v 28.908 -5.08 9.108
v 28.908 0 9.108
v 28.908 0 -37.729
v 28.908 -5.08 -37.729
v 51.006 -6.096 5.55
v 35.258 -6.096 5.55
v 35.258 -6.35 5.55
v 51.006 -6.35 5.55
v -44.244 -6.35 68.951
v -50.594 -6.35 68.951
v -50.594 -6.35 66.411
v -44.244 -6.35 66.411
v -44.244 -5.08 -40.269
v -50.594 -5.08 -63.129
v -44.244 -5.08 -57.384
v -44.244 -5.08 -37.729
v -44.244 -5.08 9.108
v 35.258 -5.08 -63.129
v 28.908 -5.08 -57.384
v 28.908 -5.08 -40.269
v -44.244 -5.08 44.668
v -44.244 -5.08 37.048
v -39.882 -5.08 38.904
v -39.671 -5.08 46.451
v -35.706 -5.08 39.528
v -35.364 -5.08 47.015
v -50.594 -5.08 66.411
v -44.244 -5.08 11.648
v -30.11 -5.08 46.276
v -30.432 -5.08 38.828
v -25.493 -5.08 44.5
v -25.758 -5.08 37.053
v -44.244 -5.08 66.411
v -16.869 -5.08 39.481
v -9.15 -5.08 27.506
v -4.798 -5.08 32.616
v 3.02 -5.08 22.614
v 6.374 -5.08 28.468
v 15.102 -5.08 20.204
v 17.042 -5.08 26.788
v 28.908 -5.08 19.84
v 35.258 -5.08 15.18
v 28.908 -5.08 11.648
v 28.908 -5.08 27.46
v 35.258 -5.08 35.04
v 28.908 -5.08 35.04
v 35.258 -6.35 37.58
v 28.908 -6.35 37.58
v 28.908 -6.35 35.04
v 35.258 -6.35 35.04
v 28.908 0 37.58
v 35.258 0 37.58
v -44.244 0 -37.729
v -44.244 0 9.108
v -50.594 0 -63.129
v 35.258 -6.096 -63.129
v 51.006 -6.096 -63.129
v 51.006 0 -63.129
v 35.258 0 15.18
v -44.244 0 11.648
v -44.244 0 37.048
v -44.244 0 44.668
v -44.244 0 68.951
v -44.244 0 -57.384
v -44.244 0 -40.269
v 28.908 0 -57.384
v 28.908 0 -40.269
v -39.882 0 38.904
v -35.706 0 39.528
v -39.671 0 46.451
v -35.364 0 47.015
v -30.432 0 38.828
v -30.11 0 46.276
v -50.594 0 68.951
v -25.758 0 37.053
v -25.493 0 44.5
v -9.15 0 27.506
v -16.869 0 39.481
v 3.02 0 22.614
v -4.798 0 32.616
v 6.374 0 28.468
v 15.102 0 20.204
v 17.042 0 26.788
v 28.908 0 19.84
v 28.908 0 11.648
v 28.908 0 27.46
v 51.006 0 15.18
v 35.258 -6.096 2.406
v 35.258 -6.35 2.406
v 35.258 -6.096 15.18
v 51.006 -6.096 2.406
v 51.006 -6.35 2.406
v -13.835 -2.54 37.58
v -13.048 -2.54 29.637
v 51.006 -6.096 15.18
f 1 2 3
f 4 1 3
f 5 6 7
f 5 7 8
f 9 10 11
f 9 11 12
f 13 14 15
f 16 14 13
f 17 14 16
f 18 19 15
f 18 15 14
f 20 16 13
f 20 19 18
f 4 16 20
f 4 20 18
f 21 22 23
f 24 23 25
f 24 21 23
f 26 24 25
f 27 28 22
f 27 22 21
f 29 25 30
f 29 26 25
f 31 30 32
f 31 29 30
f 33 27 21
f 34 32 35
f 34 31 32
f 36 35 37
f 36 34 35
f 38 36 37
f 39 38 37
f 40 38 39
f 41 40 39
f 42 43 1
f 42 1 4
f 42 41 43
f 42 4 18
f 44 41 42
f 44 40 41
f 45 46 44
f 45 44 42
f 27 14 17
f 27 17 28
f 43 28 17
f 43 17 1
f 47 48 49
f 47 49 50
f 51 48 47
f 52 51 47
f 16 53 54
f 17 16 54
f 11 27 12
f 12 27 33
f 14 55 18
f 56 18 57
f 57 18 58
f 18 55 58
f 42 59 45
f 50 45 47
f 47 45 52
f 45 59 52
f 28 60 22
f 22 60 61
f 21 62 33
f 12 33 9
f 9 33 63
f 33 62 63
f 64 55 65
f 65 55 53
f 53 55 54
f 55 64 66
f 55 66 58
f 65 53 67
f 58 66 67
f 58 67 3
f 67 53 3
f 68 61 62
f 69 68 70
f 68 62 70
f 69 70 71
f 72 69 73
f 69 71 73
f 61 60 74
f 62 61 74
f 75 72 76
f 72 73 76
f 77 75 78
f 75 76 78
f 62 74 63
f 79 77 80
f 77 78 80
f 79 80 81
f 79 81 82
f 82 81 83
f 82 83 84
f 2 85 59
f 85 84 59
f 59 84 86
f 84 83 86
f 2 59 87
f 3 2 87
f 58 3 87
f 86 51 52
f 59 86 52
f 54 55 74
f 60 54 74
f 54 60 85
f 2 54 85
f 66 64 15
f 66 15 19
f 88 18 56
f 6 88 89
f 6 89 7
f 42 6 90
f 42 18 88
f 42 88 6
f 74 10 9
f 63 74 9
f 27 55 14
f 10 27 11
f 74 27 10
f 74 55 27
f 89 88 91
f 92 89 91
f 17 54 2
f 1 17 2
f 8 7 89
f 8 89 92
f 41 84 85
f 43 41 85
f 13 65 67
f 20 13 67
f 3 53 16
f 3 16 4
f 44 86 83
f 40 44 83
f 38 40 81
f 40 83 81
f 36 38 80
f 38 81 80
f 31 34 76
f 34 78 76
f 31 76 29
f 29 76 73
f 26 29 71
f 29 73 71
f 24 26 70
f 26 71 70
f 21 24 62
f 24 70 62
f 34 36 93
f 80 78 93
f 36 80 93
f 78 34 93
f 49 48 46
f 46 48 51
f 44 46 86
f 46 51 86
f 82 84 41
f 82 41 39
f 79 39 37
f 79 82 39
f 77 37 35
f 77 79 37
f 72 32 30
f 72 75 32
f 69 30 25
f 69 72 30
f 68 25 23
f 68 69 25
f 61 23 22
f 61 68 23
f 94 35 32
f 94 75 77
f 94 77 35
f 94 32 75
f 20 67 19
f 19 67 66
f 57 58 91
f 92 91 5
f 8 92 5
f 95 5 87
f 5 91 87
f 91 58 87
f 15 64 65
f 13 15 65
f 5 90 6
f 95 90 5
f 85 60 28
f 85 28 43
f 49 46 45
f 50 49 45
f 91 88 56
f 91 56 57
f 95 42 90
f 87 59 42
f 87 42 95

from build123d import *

# Parameters (mm, degrees)
F0_W     = 73.152
F0_H     = 5.744279672
F0_H_2   = 2.54
F1_DEPTH = 5.08
F0_W_2   = 6.35
F0_W_3   = 15.748
F0_H_3   = 3.1443536282
F2_DEPTH = 6.35
F0_H_4   = 65.5344708799
F0_H_5   = 9.6294713412
F3_DEPTH = 6.096


# Not quite as in the source:
# - a feature names something its author has since deleted; it is built from what else it names


with BuildPart() as f1:
    # F0 (on Front) → F1 (new body)
    with BuildSketch(Plane.XZ):
        Polygon((-44.2442491055, -63.1286278367), (-44.2442491055, -57.3843481647), (-44.2442491055, -40.2686278367), (-44.2442491055, -37.7286278367), (-44.2442491055, -32.8348538627), (-44.2442491055, -31.8823538627), (-44.2442491055, -30.9298538627), (-44.2442491055, -20.7698538627), (-44.2442491055, -19.8173538627), (-44.2442491055, -18.8648538627), (-44.2442491055, 9.1076644534), (-44.2442491055, 11.6476644534), (-44.2442491055, 15.1796680125), (-44.2442491055, 37.0476644534), (-44.2442491055, 44.6676644534), (-44.2442491055, 66.4113721633), (-50.5942491055, 66.4113721633), (-50.5942491055, -63.1286278367), align=None)
        with BuildLine():
            add(Edge.make_bspline(
                [(28.9077508945, 27.4595177274), (11.3712688144, 24.6047450509), (-13.4084815754, 35.2112312639), (-32.4729044871, 50.7994146886), (-44.2442491055, 44.6676644534)],
                knots=[0, 0, 0, 0, 0.5425588266, 1, 1, 1, 1], degree=3))
            Line((-44.2442491055, 44.6676644534), (-44.2442491055, 37.0476644534))
            add(Edge.make_bspline(
                [(28.9077508945, 19.8395177274), (11.5484302318, 18.9806314817), (-12.3449743232, 26.085082613), (-32.5652834278, 43.6948913941), (-44.2442491055, 37.0476644534)],
                knots=[0, 0, 0, 0, 0.5368571136, 1, 1, 1, 1], degree=3))
            Line((28.9077508945, 19.8395177274), (28.9077508945, 27.4595177274))
        make_face()
        Polygon((28.9077508945, -40.2686278367), (28.9077508945, -57.3843481647), (28.9077508945, -63.1286278367), (35.2577508945, -63.1286278367), (35.2577508945, 2.4058430432), (35.2577508945, 5.5501966713), (35.2577508945, 15.1796680125), (35.2577508945, 35.0404930887), (28.9077508945, 35.0404930887), (28.9077508945, 27.4595177274), (28.9077508945, 19.8395177274), (28.9077508945, 12.2195177274), (28.9077508945, 11.6476644534), (28.9077508945, 9.1076644534), (28.9077508945, -18.8648538627), (28.9077508945, -19.8173538627), (28.9077508945, -20.7698538627), (28.9077508945, -30.9298538627), (28.9077508945, -31.8823538627), (28.9077508945, -32.8348538627), (28.9077508945, -37.7286278367), align=None)
        with Locations((-7.6682491055, -60.2564880007)):
            Rectangle(F0_W, F0_H)
        with Locations((-7.6682491055, 10.3776644534)):
            Rectangle(F0_W, F0_H_2)
        with Locations((-7.6682491055, -38.9986278367)):
            Rectangle(F0_W, F0_H_2)
    extrude(amount=F1_DEPTH)

    # F0 (on Front) → F2 (join)
    with BuildSketch(Plane.XZ):
        with Locations((-47.4192491055, 67.6813721633)):
            Rectangle(F0_W_2, F0_H_2)
        with Locations((32.0827508945, 36.3104930887)):
            Rectangle(F0_W_2, F0_H_2)
        with Locations((43.1317508945, 3.9780198572)):
            Rectangle(F0_W_3, F0_H_3)
    extrude(amount=F2_DEPTH)

    # F0 (on Front) → F3 (join)
    with BuildSketch(Plane.XZ):
        with Locations((43.1317508945, -30.3613923968)):
            Rectangle(F0_W_3, F0_H_4)
        with Locations((43.1317508945, 10.3649323419)):
            Rectangle(F0_W_3, F0_H_5)
    extrude(amount=F3_DEPTH)


solid = f1.part
